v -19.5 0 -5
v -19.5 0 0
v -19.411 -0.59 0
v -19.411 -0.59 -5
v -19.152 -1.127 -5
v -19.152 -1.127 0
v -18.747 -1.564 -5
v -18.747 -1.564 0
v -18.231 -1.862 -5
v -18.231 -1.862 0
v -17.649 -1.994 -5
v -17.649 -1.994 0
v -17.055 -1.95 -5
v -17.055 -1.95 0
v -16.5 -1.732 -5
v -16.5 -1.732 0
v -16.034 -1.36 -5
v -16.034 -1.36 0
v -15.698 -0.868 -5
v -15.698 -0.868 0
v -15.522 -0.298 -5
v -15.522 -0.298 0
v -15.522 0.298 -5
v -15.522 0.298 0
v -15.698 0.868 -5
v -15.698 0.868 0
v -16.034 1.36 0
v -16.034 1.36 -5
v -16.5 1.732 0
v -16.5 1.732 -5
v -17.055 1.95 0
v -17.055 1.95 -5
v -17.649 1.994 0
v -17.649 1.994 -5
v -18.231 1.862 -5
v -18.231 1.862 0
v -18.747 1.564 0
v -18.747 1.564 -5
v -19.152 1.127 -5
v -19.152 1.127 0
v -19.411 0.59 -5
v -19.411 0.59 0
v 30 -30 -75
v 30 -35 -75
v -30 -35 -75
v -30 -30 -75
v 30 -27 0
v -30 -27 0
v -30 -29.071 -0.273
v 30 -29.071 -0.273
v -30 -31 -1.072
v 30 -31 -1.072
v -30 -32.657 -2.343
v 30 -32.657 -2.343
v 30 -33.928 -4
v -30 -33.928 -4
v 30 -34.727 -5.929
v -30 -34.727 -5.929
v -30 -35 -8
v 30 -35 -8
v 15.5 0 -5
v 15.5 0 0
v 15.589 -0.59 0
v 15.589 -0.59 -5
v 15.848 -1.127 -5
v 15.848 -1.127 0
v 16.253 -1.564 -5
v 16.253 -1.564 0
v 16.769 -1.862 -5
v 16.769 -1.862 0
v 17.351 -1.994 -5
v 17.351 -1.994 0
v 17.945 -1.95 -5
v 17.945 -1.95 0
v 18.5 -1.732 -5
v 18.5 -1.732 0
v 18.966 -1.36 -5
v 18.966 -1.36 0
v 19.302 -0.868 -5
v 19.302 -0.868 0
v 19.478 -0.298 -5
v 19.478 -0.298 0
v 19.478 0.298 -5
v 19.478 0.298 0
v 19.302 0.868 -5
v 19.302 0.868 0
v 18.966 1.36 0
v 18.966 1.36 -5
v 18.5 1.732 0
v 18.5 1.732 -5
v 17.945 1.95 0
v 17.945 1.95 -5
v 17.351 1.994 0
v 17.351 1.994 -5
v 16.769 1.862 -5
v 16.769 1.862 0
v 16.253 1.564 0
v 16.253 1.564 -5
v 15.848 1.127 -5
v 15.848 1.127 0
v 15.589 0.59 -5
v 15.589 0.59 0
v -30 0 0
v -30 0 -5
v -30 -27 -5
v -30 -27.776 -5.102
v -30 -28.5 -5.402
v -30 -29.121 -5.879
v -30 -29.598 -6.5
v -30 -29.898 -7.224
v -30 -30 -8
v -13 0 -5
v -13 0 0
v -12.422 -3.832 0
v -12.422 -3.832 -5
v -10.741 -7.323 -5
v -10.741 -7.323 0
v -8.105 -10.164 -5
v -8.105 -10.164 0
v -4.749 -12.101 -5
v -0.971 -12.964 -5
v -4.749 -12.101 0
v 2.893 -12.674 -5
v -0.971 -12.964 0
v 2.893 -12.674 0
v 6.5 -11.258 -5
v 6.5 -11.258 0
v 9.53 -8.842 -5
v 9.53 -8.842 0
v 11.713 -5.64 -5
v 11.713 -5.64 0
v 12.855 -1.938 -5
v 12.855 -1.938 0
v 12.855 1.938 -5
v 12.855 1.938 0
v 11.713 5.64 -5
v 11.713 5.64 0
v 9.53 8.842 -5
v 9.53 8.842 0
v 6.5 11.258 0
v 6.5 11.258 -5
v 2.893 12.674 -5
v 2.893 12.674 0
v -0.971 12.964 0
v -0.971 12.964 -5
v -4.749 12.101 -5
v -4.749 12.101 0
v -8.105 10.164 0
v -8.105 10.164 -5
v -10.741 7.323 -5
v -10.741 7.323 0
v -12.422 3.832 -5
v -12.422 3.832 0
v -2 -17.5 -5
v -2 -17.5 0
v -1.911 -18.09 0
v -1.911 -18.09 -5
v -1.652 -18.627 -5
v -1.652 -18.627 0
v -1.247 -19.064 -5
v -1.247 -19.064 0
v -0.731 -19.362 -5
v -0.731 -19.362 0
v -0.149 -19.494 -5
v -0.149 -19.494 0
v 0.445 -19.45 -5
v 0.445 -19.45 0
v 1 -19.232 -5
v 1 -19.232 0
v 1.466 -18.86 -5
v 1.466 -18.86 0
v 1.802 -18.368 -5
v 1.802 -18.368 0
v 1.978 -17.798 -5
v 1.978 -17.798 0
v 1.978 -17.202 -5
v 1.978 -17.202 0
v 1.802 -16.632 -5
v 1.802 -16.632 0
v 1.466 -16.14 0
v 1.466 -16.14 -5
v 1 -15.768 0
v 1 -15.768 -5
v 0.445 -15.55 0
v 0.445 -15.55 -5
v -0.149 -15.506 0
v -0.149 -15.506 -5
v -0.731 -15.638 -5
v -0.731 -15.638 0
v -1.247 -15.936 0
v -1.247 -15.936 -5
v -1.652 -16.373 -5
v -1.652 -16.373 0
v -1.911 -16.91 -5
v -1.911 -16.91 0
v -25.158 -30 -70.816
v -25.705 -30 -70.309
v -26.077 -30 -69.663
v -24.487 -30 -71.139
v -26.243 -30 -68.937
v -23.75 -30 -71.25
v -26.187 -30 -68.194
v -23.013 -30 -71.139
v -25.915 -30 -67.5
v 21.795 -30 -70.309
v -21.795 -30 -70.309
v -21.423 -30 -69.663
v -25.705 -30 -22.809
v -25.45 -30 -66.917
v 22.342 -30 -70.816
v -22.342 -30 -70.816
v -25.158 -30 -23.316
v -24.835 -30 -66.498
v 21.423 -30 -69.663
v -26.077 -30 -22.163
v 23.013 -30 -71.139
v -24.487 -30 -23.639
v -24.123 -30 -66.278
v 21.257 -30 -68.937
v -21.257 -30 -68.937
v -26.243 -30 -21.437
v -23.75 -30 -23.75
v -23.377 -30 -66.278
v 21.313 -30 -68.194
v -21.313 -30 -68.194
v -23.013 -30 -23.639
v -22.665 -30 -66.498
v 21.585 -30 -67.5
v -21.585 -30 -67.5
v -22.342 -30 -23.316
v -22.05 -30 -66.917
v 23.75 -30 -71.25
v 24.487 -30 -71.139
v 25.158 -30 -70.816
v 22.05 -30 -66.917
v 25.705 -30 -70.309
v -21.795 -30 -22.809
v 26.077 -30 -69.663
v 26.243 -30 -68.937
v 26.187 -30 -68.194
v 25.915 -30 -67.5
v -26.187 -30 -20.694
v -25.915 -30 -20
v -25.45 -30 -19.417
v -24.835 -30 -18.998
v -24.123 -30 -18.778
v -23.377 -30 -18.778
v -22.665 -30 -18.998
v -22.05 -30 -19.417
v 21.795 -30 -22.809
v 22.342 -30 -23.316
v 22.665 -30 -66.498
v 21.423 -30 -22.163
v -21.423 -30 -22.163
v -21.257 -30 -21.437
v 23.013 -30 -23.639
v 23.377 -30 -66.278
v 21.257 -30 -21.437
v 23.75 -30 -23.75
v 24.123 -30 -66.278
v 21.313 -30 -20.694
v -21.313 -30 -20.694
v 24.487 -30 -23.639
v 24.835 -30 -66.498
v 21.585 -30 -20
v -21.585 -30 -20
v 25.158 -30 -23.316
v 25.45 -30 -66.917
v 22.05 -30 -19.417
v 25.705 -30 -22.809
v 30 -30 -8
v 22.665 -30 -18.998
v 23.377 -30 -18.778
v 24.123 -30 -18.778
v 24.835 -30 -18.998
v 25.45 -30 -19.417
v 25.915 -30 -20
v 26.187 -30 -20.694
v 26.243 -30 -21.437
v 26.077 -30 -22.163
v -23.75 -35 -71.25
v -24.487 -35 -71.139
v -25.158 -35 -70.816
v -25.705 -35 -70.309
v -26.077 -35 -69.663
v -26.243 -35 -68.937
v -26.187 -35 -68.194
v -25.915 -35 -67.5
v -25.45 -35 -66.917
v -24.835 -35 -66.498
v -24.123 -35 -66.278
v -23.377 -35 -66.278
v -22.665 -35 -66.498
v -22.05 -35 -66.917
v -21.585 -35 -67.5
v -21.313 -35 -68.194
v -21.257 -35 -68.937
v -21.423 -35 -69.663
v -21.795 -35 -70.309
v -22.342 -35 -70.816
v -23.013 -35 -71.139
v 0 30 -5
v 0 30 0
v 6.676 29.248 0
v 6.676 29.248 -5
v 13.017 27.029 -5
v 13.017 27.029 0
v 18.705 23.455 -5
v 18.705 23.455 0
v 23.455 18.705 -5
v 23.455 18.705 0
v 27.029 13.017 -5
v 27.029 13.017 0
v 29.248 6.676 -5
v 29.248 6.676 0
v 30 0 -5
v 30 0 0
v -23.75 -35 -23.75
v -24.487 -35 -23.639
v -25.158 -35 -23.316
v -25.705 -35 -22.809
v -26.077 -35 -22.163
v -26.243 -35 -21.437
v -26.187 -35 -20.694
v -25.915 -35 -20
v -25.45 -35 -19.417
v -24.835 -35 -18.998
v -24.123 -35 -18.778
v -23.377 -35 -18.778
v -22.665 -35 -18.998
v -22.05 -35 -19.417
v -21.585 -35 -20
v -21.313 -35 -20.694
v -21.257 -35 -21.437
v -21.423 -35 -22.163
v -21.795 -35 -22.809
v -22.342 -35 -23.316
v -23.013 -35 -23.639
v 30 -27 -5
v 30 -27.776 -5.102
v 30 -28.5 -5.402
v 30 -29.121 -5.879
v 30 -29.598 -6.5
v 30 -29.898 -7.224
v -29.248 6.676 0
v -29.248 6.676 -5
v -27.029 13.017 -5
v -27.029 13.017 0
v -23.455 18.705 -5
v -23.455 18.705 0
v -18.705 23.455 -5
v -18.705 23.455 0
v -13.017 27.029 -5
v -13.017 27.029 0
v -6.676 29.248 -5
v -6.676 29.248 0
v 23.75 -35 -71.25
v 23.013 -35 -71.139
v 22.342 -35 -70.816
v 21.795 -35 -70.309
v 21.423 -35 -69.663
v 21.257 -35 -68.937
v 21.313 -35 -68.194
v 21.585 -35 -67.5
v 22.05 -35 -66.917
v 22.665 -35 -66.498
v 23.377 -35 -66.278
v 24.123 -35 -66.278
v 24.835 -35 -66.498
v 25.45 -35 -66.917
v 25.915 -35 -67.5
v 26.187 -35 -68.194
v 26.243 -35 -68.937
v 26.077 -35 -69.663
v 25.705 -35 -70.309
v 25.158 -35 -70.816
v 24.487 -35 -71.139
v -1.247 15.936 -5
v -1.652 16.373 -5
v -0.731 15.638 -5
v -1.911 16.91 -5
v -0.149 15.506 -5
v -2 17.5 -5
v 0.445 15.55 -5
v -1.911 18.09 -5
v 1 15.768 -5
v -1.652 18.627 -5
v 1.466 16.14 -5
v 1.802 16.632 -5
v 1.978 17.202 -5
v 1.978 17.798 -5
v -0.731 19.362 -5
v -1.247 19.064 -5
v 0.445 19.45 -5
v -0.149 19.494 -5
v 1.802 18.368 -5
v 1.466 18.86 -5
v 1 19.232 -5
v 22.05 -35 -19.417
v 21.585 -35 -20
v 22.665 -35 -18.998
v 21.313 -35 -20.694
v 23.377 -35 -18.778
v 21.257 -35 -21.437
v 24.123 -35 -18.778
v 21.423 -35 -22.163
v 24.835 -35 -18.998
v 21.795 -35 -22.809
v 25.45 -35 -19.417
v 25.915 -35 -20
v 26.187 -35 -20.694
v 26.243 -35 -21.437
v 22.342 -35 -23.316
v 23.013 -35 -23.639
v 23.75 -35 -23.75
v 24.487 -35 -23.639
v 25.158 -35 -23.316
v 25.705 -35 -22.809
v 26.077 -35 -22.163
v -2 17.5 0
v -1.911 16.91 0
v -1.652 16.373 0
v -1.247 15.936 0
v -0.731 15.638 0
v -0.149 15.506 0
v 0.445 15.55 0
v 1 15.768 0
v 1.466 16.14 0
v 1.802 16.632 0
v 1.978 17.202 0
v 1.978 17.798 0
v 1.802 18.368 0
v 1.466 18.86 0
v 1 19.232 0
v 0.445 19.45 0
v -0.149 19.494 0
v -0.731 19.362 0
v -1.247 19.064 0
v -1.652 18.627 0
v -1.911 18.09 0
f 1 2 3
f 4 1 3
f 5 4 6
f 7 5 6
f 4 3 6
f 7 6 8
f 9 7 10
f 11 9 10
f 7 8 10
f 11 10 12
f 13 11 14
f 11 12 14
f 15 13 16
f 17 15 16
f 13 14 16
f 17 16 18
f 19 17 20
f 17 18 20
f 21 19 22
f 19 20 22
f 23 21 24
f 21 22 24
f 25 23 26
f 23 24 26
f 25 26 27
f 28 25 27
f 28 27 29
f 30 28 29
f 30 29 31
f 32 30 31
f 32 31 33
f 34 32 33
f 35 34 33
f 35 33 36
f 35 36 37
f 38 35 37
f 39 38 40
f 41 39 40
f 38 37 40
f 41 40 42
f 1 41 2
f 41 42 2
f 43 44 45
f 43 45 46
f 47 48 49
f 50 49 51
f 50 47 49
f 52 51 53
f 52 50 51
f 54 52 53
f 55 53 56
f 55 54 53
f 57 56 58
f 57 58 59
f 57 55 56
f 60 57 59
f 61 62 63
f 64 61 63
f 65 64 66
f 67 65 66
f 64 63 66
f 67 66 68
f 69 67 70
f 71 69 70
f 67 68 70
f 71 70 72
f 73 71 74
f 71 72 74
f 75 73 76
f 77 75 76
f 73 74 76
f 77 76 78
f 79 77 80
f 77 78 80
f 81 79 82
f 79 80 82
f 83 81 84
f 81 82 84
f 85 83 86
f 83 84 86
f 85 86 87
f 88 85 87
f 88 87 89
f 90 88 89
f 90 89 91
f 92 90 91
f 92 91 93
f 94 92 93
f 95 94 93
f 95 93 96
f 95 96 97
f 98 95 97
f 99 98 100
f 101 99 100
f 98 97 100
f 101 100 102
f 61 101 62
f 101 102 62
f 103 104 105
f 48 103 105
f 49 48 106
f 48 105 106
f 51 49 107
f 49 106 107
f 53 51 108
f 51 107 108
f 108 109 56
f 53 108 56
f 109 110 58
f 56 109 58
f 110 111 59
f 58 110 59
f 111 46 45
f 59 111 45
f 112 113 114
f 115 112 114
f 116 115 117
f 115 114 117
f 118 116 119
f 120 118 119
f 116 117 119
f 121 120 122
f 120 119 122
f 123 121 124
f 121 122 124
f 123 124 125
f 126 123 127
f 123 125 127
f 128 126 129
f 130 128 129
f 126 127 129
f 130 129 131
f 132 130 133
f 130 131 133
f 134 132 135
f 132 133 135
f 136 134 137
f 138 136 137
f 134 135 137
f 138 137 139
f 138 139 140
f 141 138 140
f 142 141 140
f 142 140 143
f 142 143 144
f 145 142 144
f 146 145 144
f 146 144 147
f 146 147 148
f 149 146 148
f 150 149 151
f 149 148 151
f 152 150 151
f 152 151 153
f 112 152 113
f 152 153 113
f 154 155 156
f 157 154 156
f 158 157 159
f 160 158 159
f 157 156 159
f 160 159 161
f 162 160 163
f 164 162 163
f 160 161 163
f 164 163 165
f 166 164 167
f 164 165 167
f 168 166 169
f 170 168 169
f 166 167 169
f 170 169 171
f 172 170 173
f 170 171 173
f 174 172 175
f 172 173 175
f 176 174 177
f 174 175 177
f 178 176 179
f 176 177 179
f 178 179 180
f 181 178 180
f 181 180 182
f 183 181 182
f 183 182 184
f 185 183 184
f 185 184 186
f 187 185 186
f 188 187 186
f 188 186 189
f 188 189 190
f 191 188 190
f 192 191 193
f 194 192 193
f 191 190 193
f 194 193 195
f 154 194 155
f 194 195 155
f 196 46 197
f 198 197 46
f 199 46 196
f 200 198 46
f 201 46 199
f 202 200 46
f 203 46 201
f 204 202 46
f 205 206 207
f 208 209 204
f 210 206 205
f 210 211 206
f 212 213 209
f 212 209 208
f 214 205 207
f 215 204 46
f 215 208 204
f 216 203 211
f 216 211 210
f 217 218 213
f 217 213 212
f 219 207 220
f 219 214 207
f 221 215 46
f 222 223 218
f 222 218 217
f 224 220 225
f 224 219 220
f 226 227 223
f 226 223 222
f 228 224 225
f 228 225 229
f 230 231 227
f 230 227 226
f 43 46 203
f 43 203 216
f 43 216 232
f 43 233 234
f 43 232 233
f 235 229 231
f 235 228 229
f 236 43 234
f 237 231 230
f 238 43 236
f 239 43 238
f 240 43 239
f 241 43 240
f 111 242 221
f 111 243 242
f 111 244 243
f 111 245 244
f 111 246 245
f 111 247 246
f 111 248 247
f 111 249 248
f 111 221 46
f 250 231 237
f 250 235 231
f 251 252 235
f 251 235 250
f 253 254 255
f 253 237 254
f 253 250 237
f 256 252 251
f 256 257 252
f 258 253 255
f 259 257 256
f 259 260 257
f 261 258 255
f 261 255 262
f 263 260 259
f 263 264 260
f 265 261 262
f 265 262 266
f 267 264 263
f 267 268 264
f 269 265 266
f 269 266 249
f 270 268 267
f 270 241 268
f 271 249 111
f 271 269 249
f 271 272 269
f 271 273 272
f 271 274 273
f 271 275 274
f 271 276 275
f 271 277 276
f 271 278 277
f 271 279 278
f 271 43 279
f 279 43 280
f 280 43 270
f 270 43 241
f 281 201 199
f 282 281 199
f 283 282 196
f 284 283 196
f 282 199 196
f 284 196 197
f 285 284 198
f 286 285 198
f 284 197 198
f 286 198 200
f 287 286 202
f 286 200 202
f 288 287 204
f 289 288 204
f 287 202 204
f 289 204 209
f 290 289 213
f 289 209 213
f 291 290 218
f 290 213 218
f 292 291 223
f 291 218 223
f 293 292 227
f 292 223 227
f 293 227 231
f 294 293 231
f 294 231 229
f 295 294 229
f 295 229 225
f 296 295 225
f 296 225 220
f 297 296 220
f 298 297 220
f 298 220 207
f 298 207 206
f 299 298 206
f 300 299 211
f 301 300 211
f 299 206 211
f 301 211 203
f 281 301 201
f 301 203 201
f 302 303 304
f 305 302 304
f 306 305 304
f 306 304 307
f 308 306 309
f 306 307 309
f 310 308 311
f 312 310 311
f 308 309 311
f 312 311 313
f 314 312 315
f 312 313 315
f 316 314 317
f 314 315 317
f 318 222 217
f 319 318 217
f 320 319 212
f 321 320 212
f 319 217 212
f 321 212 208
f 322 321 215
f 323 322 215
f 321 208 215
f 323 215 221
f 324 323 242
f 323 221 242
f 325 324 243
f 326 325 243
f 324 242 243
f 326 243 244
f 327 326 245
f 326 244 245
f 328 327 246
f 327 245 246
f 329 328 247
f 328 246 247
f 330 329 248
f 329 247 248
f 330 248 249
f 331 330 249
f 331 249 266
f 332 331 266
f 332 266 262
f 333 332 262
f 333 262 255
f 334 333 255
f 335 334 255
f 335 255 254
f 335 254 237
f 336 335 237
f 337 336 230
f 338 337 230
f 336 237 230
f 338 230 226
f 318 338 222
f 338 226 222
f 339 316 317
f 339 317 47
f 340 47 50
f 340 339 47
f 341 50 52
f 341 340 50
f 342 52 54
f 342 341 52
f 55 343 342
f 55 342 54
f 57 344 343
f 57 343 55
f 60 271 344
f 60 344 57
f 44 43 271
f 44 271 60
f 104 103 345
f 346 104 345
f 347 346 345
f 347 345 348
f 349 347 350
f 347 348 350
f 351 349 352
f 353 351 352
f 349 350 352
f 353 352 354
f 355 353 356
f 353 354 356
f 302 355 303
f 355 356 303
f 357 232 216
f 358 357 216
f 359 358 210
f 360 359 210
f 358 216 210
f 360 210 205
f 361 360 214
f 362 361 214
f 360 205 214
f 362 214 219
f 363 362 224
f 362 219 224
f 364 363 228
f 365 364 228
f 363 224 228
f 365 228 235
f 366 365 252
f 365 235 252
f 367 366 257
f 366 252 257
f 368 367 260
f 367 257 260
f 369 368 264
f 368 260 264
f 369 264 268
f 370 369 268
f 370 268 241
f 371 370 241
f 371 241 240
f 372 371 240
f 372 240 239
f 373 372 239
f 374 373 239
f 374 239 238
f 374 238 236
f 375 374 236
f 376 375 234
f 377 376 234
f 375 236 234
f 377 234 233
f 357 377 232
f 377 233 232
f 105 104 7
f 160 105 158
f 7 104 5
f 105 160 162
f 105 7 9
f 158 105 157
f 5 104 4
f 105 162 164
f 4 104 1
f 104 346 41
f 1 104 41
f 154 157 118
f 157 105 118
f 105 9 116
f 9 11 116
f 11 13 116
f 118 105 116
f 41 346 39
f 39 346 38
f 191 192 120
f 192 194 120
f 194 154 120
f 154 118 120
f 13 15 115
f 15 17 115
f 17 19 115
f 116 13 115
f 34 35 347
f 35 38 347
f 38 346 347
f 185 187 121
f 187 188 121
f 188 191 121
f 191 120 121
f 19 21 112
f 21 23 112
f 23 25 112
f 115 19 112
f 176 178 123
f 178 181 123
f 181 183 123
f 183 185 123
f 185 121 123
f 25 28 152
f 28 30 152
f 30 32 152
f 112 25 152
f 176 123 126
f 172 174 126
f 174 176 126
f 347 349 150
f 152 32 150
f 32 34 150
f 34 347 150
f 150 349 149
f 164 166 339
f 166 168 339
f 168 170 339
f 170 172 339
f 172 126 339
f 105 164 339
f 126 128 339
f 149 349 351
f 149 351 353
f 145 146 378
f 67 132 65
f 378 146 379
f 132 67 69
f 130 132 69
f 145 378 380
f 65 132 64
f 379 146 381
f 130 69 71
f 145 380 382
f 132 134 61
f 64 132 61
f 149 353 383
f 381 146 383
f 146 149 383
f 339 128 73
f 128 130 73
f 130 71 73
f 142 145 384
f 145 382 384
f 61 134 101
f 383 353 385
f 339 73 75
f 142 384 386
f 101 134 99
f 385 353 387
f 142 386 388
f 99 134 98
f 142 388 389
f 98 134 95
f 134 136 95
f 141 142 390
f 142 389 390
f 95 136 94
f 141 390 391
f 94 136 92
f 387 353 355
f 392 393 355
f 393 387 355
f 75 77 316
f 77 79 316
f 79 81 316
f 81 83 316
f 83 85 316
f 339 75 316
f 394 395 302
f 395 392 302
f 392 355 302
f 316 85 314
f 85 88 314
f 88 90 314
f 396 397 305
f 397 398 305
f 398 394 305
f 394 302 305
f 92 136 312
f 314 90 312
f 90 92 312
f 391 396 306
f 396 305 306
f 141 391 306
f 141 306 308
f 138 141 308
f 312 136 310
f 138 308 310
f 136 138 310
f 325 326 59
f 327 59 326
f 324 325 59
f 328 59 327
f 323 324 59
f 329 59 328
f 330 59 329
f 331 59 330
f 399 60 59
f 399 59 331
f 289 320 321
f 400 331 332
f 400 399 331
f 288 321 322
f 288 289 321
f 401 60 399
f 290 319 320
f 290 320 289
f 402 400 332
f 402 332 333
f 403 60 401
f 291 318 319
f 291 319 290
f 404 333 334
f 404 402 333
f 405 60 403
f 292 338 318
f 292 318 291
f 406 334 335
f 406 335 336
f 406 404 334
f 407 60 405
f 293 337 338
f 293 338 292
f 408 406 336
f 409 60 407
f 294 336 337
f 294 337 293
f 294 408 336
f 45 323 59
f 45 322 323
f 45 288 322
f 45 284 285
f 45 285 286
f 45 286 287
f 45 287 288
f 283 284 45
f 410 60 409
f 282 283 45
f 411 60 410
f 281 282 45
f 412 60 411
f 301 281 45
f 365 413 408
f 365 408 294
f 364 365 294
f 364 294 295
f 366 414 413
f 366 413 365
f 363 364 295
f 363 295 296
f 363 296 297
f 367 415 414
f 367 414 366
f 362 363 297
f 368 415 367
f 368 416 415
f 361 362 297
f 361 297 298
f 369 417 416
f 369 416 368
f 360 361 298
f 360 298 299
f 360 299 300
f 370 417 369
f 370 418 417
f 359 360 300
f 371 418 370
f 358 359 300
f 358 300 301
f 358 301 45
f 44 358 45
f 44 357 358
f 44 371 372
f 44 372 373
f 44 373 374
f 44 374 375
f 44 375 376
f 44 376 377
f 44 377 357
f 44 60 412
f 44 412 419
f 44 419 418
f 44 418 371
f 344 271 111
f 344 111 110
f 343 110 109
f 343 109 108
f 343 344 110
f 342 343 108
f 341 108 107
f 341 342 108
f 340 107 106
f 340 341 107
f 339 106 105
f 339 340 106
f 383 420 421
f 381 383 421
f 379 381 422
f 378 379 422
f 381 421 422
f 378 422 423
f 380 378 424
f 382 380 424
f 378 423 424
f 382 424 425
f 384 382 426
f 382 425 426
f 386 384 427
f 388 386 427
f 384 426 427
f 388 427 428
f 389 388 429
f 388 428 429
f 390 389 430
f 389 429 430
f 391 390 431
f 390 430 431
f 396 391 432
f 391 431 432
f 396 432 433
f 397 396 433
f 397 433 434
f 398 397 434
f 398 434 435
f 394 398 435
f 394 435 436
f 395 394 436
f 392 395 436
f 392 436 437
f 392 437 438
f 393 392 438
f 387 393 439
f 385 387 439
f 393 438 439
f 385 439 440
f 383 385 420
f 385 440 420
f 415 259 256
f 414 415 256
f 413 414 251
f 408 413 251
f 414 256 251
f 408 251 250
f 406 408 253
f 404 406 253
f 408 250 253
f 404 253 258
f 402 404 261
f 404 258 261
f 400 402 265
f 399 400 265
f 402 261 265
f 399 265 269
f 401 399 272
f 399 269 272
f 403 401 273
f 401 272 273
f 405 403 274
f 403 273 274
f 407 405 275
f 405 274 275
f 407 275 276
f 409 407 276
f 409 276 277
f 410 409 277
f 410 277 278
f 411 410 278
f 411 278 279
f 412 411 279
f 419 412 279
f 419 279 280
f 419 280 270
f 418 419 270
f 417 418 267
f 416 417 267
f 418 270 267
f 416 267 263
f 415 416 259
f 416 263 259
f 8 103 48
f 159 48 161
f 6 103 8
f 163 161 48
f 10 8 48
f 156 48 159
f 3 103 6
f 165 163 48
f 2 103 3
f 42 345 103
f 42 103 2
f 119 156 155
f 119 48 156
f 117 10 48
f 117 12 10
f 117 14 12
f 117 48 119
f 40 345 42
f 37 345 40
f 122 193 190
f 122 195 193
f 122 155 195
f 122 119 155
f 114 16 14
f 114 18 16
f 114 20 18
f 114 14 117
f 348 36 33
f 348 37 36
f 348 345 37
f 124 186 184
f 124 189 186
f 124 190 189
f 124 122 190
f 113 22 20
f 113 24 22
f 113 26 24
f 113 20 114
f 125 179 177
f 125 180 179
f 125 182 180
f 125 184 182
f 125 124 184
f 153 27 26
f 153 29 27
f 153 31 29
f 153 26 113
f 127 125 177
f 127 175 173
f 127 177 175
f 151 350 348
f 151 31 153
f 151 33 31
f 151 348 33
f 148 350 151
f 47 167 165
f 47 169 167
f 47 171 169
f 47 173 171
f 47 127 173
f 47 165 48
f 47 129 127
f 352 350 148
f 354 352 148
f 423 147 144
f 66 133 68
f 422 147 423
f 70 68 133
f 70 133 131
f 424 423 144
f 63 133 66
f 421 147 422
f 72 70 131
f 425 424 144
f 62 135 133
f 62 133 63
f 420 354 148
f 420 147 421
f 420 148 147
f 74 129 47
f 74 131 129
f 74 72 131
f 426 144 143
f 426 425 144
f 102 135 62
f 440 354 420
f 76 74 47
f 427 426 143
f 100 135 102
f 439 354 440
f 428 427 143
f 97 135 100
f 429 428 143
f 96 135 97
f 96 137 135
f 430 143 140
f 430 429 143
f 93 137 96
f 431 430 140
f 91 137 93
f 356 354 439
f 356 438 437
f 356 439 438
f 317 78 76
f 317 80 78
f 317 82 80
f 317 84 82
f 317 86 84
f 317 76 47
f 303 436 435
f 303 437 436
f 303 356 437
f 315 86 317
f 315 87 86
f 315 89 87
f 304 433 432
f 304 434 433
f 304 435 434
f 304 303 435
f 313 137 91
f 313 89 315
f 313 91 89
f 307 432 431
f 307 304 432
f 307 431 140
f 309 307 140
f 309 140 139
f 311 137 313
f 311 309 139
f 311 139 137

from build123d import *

# Parameters (mm, degrees)
SKETCH_10_W                      = 60
SKETCH_10_H                      = 60
SM_BASE_FLANGE_2_DEPTH           = 5
SM_EDGE_FLANGE_2_STRIP_W         = 26
SM_EDGE_FLANGE_2_STRIP_H         = 5
SM_EDGE_FLANGE_2_STRIP_CUT_DEPTH = 60
SM_EDGE_FLANGE_2_DEPTH           = 60
SKETCH_19_R                      = 2
SKETCH_19_R_2                    = 13
CUT_EXTRUDE_2_DEPTH              = 5
CUT_EXTRUDE_START                = -30
SKETCH_28_R                      = 2.5
CUT_EXTRUDE_4_DEPTH              = 5
CUT_EXTRUDE_5_DEPTH              = 5


# Sheet-metal steps are written as plain solids
with BuildPart() as part:
    # 草图10 → 基体-法兰2 (new body)
    with BuildSketch(Plane.XY):
        Rectangle(SKETCH_10_W, SKETCH_10_H)
    extrude(amount=-SM_BASE_FLANGE_2_DEPTH)

    # 边线-法兰2 strip (across the edge) → 边线-法兰2 strip cut (cut)
    with BuildSketch(Plane(origin=(30, -30, -5), x_dir=(0, 1, 0), z_dir=(-1, 0, 0))):
        with Locations((-10, -2.5)):
            Rectangle(SM_EDGE_FLANGE_2_STRIP_W, SM_EDGE_FLANGE_2_STRIP_H)
    extrude(amount=SM_EDGE_FLANGE_2_STRIP_CUT_DEPTH, mode=Mode.SUBTRACT)

    # 边线-法兰2 section (across the edge) → 边线-法兰2 (add)
    with BuildSketch(Plane(origin=(30, -30, -5), x_dir=(0, 1, 0), z_dir=(-1, 0, 0))):
        with BuildLine():
            Line((-5, 3), (-5, 70))
            Line((-5, 70), (0, 70))
            Line((0, 70), (0, 3))
            ThreePointArc((0, 3), (0.878679656, 0.878679656), (3, 0))
            Line((3, 0), (3, -5))
            ThreePointArc((3, -5), (-2.656854249, -2.656854249), (-5, 3))
        make_face()
    extrude(amount=SM_EDGE_FLANGE_2_DEPTH)

    # 草图19 → 切除-拉伸2 (cut)
    with BuildSketch(Plane.XY):
        with Locations(Location((-17.5, 0, 0), (0, 0, 180))):
            Circle(SKETCH_19_R)
        with Locations(Location((17.5, 0, 0), (0, 0, 180))):
            Circle(SKETCH_19_R)
        with Locations(Location((0, 17.5, 0), (0, 0, 180))):
            Circle(SKETCH_19_R)
        with Locations(Location((0, -17.5, 0), (0, 0, 180))):
            Circle(SKETCH_19_R)
        with Locations(Location((0, 0, 0), (0, 0, 180))):
            Circle(SKETCH_19_R_2)
    extrude(amount=-CUT_EXTRUDE_2_DEPTH, mode=Mode.SUBTRACT)

    # 草图28 → 切除-拉伸4 (cut)
    with BuildSketch(Plane(origin=(0, 0, 0), x_dir=(1, 0, 0), z_dir=(0, 1, 0)).offset(CUT_EXTRUDE_START)):
        with Locations(Location((-23.75, 21.25, 0), (0, 0, 90))):
            Circle(SKETCH_28_R)
        with Locations(Location((-23.75, 68.75, 0), (0, 0, 90))):
            Circle(SKETCH_28_R)
        with Locations(Location((23.75, 68.75, 0), (0, 0, 90))):
            Circle(SKETCH_28_R)
        with Locations(Location((23.75, 21.25, 0), (0, 0, 90))):
            Circle(SKETCH_28_R)
    extrude(amount=-CUT_EXTRUDE_4_DEPTH, mode=Mode.SUBTRACT)

    # 草图29 → 切除-拉伸5 (cut)
    with BuildSketch(Plane.XY):
        with BuildLine():
            ThreePointArc((-30, 0), (-21.213203436, 21.213203436), (0, 30))
            Line((0, 30), (-30, 30))
            Line((-30, 30), (-30, 0))
        make_face()
        with BuildLine():
            Line((30, 30), (0, 30))
            ThreePointArc((0, 30), (21.213203436, 21.213203436), (30, 0))
            Line((30, 0), (30, 30))
        make_face()
    extrude(amount=-CUT_EXTRUDE_5_DEPTH, mode=Mode.SUBTRACT)


solid = part.part
